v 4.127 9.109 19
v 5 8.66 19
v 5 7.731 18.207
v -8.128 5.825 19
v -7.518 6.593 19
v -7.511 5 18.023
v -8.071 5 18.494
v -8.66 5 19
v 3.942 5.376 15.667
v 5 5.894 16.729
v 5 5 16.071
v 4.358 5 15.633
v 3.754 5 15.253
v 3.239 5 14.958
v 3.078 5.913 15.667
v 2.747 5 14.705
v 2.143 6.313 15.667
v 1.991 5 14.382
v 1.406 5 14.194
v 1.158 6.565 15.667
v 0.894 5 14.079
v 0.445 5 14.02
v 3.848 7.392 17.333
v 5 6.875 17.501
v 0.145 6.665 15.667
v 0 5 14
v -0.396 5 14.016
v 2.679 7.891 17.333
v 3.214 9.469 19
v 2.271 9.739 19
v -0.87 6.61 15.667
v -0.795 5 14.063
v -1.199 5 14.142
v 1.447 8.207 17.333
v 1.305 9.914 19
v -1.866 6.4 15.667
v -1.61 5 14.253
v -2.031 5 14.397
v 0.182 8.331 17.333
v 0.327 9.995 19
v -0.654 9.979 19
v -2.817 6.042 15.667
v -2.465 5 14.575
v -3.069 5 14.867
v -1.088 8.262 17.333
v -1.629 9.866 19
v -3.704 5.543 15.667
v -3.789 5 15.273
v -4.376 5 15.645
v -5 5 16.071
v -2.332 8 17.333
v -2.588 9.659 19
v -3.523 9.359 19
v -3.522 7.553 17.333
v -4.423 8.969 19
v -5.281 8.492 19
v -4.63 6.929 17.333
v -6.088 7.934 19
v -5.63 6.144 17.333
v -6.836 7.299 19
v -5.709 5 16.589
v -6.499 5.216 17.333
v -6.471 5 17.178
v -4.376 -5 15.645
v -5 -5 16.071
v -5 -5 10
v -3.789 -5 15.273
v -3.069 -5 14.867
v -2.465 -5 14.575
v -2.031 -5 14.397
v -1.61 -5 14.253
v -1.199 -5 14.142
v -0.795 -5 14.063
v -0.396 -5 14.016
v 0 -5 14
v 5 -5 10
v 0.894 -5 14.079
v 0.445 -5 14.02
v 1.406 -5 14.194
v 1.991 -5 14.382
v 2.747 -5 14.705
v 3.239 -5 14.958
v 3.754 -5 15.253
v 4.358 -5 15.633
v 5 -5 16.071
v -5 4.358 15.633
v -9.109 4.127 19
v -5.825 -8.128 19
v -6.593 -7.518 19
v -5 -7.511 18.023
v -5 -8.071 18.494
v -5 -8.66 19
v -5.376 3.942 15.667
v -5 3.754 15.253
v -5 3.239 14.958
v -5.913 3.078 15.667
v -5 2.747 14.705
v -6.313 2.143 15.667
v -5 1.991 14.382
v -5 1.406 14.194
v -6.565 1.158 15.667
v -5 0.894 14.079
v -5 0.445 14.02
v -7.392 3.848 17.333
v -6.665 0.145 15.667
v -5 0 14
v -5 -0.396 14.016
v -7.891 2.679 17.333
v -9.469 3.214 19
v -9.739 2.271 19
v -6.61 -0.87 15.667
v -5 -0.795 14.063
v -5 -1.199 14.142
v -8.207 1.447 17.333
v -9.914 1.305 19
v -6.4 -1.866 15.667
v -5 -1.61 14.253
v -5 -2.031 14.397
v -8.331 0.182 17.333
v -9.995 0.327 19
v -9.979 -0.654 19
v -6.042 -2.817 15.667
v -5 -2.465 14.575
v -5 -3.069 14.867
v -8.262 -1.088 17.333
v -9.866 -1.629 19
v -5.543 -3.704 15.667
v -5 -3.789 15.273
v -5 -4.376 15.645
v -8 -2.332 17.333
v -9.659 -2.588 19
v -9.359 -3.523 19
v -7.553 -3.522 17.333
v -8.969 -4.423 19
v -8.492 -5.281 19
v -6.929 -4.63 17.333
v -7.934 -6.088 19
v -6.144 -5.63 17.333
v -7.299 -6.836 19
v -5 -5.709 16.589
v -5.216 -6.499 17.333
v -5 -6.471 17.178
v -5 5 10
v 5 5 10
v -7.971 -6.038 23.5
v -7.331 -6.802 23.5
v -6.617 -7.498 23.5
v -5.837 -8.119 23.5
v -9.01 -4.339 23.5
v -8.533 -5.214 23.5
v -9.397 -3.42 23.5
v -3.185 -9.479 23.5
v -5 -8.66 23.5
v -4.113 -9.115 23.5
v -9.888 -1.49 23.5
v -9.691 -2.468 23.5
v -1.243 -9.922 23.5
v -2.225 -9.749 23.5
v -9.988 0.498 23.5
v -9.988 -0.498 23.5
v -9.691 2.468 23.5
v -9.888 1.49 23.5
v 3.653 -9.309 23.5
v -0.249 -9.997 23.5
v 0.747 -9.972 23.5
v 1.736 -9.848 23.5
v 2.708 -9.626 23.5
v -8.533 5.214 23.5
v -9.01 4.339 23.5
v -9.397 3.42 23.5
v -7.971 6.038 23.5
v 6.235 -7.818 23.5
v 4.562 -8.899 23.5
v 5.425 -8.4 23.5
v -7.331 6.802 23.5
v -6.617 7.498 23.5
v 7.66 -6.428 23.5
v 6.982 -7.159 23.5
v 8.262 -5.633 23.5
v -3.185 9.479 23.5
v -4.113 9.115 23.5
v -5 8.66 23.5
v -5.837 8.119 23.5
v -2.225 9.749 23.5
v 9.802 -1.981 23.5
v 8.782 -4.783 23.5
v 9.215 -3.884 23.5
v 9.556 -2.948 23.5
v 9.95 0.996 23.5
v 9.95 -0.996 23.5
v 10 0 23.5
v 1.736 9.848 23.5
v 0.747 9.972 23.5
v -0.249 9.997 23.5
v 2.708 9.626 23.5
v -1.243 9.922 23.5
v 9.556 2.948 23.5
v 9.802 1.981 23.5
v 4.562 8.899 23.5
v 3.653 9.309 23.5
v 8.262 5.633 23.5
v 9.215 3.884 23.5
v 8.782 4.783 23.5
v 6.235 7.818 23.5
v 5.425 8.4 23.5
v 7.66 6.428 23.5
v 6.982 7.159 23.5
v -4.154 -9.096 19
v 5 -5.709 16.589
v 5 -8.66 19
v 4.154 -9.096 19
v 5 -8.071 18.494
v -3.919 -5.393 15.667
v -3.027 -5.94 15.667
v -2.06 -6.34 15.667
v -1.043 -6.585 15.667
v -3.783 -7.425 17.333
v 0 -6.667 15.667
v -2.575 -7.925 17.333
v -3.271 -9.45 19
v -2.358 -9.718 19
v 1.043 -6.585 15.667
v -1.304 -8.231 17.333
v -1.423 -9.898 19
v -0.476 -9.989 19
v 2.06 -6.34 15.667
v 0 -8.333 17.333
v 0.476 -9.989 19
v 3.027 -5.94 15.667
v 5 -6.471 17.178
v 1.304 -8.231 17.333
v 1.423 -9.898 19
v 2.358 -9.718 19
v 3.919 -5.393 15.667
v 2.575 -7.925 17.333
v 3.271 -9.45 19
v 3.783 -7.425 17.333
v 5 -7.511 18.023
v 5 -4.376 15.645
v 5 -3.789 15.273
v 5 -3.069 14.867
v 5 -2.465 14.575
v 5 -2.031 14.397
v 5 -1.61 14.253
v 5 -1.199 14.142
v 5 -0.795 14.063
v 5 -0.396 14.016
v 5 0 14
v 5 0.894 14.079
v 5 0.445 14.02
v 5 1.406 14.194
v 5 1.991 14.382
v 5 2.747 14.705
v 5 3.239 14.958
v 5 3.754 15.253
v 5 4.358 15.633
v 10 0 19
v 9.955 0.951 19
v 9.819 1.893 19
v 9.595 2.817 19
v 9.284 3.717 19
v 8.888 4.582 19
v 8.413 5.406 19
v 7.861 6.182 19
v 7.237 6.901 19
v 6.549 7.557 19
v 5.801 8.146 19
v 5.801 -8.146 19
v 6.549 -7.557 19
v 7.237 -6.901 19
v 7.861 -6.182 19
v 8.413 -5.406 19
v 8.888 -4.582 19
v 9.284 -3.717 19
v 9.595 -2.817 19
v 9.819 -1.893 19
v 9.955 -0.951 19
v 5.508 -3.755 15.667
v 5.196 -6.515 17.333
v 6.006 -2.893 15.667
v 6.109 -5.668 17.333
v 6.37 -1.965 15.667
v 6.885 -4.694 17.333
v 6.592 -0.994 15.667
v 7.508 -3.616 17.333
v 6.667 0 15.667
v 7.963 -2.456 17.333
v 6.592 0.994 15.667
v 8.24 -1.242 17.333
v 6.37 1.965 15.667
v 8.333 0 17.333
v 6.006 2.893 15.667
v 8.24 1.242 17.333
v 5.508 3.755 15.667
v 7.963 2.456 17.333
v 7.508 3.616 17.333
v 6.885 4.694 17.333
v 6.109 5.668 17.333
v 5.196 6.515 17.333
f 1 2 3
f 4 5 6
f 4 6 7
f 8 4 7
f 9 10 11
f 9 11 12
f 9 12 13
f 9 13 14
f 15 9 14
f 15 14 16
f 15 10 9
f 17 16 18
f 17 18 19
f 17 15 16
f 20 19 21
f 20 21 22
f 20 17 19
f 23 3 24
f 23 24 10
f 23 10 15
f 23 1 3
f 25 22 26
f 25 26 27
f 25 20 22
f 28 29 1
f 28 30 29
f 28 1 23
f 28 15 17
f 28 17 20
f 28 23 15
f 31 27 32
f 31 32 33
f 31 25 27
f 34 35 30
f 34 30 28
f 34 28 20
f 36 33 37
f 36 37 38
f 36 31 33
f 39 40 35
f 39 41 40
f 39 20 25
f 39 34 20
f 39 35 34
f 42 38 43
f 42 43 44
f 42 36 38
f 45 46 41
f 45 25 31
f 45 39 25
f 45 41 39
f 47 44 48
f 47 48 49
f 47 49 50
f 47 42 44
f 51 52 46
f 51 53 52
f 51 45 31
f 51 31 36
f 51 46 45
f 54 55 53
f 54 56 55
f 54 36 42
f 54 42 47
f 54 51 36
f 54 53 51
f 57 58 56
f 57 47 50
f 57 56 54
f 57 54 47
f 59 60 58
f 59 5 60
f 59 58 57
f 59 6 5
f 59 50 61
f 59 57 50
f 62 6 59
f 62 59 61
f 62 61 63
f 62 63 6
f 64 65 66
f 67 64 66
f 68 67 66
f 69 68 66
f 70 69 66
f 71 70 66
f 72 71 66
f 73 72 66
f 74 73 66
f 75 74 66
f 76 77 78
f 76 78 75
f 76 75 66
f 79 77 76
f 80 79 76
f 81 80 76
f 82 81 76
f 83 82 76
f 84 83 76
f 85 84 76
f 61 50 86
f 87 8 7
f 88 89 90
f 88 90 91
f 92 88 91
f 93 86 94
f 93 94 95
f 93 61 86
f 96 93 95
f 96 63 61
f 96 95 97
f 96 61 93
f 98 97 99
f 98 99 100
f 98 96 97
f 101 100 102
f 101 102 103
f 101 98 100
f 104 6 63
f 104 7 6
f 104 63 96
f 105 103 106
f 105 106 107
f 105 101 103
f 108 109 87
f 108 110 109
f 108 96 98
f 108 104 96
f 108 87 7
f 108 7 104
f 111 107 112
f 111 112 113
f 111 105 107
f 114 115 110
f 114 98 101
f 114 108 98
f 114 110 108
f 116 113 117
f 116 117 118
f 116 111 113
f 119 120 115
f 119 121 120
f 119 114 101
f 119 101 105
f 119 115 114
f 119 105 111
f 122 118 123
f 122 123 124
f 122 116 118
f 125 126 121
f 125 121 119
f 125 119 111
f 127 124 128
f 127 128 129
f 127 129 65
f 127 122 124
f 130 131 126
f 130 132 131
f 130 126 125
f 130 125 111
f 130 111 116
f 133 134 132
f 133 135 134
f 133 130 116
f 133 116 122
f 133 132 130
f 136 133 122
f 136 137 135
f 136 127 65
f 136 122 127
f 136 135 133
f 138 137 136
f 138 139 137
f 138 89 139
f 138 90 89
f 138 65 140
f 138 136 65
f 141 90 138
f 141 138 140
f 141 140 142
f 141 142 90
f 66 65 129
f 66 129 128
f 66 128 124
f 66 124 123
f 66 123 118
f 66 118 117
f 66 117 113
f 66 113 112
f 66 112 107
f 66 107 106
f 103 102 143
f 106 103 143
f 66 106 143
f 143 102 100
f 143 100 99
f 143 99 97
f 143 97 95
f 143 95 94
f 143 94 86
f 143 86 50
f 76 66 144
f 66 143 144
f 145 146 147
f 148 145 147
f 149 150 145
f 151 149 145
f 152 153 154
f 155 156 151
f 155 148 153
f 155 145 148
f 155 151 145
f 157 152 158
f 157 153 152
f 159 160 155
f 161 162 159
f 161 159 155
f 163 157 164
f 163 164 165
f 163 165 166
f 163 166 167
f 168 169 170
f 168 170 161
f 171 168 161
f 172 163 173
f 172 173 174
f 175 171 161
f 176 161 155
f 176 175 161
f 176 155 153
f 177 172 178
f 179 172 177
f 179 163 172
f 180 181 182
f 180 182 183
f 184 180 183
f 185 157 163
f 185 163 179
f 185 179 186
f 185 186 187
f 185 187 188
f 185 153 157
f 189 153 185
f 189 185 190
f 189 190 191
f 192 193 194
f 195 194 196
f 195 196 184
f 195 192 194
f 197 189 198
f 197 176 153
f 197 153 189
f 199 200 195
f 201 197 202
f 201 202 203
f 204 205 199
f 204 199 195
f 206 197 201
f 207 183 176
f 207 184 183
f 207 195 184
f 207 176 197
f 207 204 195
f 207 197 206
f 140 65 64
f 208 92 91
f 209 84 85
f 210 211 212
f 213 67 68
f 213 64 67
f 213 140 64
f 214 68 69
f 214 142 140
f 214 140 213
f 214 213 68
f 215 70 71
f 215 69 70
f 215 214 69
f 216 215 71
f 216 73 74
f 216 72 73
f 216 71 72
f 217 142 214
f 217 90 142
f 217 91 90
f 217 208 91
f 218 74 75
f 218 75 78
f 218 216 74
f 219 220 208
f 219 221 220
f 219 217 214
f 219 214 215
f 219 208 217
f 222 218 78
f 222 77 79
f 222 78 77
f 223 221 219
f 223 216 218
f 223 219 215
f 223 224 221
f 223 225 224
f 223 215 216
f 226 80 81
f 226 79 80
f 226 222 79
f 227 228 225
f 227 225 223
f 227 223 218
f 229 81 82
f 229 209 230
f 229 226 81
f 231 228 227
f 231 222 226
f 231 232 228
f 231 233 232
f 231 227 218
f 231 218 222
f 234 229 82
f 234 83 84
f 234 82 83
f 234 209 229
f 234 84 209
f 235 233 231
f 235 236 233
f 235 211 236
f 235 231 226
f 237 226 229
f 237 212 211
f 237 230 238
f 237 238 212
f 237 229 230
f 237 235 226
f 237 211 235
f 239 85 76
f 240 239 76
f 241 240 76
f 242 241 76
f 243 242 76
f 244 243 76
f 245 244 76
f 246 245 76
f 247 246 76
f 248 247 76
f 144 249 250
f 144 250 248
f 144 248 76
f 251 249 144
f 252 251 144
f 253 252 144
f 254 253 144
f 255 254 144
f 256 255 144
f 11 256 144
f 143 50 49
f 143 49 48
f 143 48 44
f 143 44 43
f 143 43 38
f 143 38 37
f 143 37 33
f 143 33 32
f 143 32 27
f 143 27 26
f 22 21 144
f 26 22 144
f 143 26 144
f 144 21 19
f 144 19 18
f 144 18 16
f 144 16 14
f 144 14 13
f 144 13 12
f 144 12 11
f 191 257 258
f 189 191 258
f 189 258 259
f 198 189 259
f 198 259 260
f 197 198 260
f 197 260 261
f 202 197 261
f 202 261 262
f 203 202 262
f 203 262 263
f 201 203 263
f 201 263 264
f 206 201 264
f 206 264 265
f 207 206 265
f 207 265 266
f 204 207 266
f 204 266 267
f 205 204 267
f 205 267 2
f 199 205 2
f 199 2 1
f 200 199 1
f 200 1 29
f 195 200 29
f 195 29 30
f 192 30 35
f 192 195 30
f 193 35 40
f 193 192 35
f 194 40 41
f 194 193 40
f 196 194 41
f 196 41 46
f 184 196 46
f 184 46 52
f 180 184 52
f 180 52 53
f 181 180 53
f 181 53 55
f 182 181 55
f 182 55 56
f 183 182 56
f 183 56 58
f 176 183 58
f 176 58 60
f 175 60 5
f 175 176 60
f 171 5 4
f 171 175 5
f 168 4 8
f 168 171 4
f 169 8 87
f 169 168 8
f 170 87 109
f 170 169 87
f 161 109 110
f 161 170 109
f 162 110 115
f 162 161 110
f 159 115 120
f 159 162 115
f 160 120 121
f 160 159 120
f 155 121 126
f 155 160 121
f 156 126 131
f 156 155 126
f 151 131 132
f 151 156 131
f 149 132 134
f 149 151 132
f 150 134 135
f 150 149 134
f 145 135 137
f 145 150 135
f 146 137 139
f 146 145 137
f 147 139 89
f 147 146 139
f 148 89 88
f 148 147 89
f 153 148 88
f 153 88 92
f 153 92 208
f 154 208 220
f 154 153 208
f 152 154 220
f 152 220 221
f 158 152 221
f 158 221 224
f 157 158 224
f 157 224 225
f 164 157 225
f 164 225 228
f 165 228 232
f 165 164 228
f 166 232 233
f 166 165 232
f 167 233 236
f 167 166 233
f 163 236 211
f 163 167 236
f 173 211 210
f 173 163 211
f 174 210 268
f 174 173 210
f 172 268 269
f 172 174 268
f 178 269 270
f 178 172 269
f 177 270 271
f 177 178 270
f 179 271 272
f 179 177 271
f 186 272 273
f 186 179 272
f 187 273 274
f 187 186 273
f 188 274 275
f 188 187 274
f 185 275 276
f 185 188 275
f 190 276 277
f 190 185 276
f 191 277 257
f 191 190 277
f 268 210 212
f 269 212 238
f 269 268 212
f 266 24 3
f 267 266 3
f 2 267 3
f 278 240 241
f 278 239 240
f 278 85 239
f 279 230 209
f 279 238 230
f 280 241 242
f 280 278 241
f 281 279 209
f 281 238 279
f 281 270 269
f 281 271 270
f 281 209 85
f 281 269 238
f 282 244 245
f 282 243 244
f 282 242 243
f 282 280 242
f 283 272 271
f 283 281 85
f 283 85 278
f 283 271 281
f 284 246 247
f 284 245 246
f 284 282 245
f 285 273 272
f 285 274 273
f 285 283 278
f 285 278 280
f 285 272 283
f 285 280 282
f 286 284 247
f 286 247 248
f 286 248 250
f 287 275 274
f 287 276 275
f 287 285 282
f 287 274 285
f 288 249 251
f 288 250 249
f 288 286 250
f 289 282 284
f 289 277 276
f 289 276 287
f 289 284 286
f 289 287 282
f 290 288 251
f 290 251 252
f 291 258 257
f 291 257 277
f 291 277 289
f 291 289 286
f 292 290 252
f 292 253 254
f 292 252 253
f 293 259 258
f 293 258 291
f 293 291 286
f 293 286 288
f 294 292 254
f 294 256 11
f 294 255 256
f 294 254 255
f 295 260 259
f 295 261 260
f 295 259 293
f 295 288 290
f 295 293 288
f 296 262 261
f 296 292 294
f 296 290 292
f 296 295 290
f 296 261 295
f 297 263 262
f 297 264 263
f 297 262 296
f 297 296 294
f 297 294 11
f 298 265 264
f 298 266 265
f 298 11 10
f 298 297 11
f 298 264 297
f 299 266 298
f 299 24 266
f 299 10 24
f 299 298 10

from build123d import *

# Parameters (mm, degrees)
F0_W     = 41
F0_H     = 41
F0_W_2   = 10
F0_H_2   = 10
F1_DEPTH = 10
F2_DEPTH = 25
F3_R     = 10
F4_DEPTH = 8
F6_DEPTH = 25
F7_DEPTH = 1.5
F8_DEPTH = 10
F9_DEPTH = 3


# Not quite as in the source:
# - a fillet or chamfer that OpenCascade refuses, or shapes differently, is made with other operations: its cross-section is extruded or revolved along the edge and cut away or added


with BuildPart() as f1:
    # F0 (on Top) → F1 (new body)
    with BuildSketch(Plane.XY):
        Rectangle(F0_W, F0_H)
        Rectangle(F0_W_2, F0_H_2, mode=Mode.SUBTRACT)
        Rectangle(F0_W_2, F0_H_2)
    extrude(amount=F1_DEPTH)

    # F0 (on Top) → F2 (join)
    with BuildSketch(Plane.XY):
        Rectangle(F0_W_2, F0_H_2)
    extrude(amount=F2_DEPTH)

    # F3 (on face) → F4 (join)
    with BuildSketch(Plane.XY.offset(25)):
        Circle(F3_R)
    extrude(amount=-F4_DEPTH)

    # F5 (on face) → F6 (cut)
    with BuildSketch(Plane(origin=(0, 0, 0), x_dir=(1, 0, 0), z_dir=(0, 0, -1))):
        with BuildLine():
            Line((0, 20.5), (0, 16.625))
            ThreePointArc((0, 16.625), (14.2014511666, 13.1849661001), (20.5, 0))
            Line((20.5, 0), (20.5, 20.5))
            Line((20.5, 20.5), (0, 20.5))
        make_face()
        with BuildLine():
            Line((20.5, -20.5), (20.5, 0))
            Line((20.5, 0), (16.625, 0))
            ThreePointArc((16.625, 0), (13.15340166, -14.1758531755), (0, -20.5))
            Line((0, -20.5), (20.5, -20.5))
        make_face()
        with BuildLine():
            ThreePointArc((0, -16.625), (-14.1919455674, -13.1732449101), (-20.5, 0))
            Line((-20.5, 0), (-20.5, -20.5))
            Line((-20.5, -20.5), (0, -20.5))
            Line((0, -20.5), (0, -16.625))
        make_face()
        with BuildLine():
            ThreePointArc((-16.625, 0), (-13.1636820987, 14.1841903605), (0, 20.5))
            Line((0, 20.5), (-20.5, 20.5))
            Line((-20.5, 20.5), (-20.5, 0))
            Line((-20.5, 0), (-16.625, 0))
        make_face()
    extrude(amount=-F6_DEPTH, mode=Mode.SUBTRACT)

    # F7 (cut): a face of the model
    f7_faces = [f1.faces().sort_by_distance(p)[0] for p in [
        (0, 0, 25),
    ]]
    extrude(f7_faces, amount=-F7_DEPTH, mode=Mode.SUBTRACT)

    # F8 (cut): a face of the model
    f8_faces = [f1.faces().sort_by_distance(p)[0] for p in [
        (0.0007164835, -0.0062799282, 0),
    ]]
    extrude(f8_faces, amount=-F8_DEPTH, mode=Mode.SUBTRACT)

    # F9 (add): a face of the model
    f9_faces = [f1.faces().sort_by_distance(p)[0] for p in [
        (-9.7171572875, 0, 17),
    ]]
    extrude(f9_faces, amount=F9_DEPTH)

    # F10: chamfer of 5 on 1 edges, made by hand


with BuildPart() as f10_tool2:
    # F10_s3 → F10_t4 (revolve)
    with BuildSketch(Plane.XZ):
        Polygon((5, 14), (10, 19), (10, 14), align=None)
    revolve(axis=Axis((0, 0, 14), (0, 0, 1)))

    split(bisect_by=Plane.YZ.offset(5), keep=Keep.TOP)


with BuildPart() as f1_1:
    add(f1.part)

    # F10_t1: cut F10_tool2
    add(f10_tool2.part, mode=Mode.SUBTRACT)


with BuildPart() as f10_tool7:
    # F10_s8 → F10_t9 (revolve)
    with BuildSketch(Plane.XZ):
        Polygon((5, 14), (10, 19), (10, 14), align=None)
    revolve(axis=Axis((0, 0, 14), (0, 0, 1)))

    split(bisect_by=Plane.XZ.offset(-5), keep=Keep.BOTTOM)


with BuildPart() as f1_2:
    add(f1_1.part)

    # F10_t6: cut F10_tool7
    add(f10_tool7.part, mode=Mode.SUBTRACT)


with BuildPart() as f10_tool12:
    # F10_s13 → F10_t14 (revolve)
    with BuildSketch(Plane.XZ):
        Polygon((5, 14), (10, 19), (10, 14), align=None)
    revolve(axis=Axis((0, 0, 14), (0, 0, 1)))

    split(bisect_by=Plane.YZ.offset(-5), keep=Keep.BOTTOM)


with BuildPart() as f1_3:
    add(f1_2.part)

    # F10_t11: cut F10_tool12
    add(f10_tool12.part, mode=Mode.SUBTRACT)


with BuildPart() as f10_tool17:
    # F10_s18 → F10_t19 (revolve)
    with BuildSketch(Plane.XZ):
        Polygon((5, 14), (10, 19), (10, 14), align=None)
    revolve(axis=Axis((0, 0, 14), (0, 0, 1)))

    split(bisect_by=Plane.XZ.offset(5), keep=Keep.TOP)


with BuildPart() as f1_4:
    add(f1_3.part)

    # F10_t16: cut F10_tool17
    add(f10_tool17.part, mode=Mode.SUBTRACT)


solid = f1_4.part
